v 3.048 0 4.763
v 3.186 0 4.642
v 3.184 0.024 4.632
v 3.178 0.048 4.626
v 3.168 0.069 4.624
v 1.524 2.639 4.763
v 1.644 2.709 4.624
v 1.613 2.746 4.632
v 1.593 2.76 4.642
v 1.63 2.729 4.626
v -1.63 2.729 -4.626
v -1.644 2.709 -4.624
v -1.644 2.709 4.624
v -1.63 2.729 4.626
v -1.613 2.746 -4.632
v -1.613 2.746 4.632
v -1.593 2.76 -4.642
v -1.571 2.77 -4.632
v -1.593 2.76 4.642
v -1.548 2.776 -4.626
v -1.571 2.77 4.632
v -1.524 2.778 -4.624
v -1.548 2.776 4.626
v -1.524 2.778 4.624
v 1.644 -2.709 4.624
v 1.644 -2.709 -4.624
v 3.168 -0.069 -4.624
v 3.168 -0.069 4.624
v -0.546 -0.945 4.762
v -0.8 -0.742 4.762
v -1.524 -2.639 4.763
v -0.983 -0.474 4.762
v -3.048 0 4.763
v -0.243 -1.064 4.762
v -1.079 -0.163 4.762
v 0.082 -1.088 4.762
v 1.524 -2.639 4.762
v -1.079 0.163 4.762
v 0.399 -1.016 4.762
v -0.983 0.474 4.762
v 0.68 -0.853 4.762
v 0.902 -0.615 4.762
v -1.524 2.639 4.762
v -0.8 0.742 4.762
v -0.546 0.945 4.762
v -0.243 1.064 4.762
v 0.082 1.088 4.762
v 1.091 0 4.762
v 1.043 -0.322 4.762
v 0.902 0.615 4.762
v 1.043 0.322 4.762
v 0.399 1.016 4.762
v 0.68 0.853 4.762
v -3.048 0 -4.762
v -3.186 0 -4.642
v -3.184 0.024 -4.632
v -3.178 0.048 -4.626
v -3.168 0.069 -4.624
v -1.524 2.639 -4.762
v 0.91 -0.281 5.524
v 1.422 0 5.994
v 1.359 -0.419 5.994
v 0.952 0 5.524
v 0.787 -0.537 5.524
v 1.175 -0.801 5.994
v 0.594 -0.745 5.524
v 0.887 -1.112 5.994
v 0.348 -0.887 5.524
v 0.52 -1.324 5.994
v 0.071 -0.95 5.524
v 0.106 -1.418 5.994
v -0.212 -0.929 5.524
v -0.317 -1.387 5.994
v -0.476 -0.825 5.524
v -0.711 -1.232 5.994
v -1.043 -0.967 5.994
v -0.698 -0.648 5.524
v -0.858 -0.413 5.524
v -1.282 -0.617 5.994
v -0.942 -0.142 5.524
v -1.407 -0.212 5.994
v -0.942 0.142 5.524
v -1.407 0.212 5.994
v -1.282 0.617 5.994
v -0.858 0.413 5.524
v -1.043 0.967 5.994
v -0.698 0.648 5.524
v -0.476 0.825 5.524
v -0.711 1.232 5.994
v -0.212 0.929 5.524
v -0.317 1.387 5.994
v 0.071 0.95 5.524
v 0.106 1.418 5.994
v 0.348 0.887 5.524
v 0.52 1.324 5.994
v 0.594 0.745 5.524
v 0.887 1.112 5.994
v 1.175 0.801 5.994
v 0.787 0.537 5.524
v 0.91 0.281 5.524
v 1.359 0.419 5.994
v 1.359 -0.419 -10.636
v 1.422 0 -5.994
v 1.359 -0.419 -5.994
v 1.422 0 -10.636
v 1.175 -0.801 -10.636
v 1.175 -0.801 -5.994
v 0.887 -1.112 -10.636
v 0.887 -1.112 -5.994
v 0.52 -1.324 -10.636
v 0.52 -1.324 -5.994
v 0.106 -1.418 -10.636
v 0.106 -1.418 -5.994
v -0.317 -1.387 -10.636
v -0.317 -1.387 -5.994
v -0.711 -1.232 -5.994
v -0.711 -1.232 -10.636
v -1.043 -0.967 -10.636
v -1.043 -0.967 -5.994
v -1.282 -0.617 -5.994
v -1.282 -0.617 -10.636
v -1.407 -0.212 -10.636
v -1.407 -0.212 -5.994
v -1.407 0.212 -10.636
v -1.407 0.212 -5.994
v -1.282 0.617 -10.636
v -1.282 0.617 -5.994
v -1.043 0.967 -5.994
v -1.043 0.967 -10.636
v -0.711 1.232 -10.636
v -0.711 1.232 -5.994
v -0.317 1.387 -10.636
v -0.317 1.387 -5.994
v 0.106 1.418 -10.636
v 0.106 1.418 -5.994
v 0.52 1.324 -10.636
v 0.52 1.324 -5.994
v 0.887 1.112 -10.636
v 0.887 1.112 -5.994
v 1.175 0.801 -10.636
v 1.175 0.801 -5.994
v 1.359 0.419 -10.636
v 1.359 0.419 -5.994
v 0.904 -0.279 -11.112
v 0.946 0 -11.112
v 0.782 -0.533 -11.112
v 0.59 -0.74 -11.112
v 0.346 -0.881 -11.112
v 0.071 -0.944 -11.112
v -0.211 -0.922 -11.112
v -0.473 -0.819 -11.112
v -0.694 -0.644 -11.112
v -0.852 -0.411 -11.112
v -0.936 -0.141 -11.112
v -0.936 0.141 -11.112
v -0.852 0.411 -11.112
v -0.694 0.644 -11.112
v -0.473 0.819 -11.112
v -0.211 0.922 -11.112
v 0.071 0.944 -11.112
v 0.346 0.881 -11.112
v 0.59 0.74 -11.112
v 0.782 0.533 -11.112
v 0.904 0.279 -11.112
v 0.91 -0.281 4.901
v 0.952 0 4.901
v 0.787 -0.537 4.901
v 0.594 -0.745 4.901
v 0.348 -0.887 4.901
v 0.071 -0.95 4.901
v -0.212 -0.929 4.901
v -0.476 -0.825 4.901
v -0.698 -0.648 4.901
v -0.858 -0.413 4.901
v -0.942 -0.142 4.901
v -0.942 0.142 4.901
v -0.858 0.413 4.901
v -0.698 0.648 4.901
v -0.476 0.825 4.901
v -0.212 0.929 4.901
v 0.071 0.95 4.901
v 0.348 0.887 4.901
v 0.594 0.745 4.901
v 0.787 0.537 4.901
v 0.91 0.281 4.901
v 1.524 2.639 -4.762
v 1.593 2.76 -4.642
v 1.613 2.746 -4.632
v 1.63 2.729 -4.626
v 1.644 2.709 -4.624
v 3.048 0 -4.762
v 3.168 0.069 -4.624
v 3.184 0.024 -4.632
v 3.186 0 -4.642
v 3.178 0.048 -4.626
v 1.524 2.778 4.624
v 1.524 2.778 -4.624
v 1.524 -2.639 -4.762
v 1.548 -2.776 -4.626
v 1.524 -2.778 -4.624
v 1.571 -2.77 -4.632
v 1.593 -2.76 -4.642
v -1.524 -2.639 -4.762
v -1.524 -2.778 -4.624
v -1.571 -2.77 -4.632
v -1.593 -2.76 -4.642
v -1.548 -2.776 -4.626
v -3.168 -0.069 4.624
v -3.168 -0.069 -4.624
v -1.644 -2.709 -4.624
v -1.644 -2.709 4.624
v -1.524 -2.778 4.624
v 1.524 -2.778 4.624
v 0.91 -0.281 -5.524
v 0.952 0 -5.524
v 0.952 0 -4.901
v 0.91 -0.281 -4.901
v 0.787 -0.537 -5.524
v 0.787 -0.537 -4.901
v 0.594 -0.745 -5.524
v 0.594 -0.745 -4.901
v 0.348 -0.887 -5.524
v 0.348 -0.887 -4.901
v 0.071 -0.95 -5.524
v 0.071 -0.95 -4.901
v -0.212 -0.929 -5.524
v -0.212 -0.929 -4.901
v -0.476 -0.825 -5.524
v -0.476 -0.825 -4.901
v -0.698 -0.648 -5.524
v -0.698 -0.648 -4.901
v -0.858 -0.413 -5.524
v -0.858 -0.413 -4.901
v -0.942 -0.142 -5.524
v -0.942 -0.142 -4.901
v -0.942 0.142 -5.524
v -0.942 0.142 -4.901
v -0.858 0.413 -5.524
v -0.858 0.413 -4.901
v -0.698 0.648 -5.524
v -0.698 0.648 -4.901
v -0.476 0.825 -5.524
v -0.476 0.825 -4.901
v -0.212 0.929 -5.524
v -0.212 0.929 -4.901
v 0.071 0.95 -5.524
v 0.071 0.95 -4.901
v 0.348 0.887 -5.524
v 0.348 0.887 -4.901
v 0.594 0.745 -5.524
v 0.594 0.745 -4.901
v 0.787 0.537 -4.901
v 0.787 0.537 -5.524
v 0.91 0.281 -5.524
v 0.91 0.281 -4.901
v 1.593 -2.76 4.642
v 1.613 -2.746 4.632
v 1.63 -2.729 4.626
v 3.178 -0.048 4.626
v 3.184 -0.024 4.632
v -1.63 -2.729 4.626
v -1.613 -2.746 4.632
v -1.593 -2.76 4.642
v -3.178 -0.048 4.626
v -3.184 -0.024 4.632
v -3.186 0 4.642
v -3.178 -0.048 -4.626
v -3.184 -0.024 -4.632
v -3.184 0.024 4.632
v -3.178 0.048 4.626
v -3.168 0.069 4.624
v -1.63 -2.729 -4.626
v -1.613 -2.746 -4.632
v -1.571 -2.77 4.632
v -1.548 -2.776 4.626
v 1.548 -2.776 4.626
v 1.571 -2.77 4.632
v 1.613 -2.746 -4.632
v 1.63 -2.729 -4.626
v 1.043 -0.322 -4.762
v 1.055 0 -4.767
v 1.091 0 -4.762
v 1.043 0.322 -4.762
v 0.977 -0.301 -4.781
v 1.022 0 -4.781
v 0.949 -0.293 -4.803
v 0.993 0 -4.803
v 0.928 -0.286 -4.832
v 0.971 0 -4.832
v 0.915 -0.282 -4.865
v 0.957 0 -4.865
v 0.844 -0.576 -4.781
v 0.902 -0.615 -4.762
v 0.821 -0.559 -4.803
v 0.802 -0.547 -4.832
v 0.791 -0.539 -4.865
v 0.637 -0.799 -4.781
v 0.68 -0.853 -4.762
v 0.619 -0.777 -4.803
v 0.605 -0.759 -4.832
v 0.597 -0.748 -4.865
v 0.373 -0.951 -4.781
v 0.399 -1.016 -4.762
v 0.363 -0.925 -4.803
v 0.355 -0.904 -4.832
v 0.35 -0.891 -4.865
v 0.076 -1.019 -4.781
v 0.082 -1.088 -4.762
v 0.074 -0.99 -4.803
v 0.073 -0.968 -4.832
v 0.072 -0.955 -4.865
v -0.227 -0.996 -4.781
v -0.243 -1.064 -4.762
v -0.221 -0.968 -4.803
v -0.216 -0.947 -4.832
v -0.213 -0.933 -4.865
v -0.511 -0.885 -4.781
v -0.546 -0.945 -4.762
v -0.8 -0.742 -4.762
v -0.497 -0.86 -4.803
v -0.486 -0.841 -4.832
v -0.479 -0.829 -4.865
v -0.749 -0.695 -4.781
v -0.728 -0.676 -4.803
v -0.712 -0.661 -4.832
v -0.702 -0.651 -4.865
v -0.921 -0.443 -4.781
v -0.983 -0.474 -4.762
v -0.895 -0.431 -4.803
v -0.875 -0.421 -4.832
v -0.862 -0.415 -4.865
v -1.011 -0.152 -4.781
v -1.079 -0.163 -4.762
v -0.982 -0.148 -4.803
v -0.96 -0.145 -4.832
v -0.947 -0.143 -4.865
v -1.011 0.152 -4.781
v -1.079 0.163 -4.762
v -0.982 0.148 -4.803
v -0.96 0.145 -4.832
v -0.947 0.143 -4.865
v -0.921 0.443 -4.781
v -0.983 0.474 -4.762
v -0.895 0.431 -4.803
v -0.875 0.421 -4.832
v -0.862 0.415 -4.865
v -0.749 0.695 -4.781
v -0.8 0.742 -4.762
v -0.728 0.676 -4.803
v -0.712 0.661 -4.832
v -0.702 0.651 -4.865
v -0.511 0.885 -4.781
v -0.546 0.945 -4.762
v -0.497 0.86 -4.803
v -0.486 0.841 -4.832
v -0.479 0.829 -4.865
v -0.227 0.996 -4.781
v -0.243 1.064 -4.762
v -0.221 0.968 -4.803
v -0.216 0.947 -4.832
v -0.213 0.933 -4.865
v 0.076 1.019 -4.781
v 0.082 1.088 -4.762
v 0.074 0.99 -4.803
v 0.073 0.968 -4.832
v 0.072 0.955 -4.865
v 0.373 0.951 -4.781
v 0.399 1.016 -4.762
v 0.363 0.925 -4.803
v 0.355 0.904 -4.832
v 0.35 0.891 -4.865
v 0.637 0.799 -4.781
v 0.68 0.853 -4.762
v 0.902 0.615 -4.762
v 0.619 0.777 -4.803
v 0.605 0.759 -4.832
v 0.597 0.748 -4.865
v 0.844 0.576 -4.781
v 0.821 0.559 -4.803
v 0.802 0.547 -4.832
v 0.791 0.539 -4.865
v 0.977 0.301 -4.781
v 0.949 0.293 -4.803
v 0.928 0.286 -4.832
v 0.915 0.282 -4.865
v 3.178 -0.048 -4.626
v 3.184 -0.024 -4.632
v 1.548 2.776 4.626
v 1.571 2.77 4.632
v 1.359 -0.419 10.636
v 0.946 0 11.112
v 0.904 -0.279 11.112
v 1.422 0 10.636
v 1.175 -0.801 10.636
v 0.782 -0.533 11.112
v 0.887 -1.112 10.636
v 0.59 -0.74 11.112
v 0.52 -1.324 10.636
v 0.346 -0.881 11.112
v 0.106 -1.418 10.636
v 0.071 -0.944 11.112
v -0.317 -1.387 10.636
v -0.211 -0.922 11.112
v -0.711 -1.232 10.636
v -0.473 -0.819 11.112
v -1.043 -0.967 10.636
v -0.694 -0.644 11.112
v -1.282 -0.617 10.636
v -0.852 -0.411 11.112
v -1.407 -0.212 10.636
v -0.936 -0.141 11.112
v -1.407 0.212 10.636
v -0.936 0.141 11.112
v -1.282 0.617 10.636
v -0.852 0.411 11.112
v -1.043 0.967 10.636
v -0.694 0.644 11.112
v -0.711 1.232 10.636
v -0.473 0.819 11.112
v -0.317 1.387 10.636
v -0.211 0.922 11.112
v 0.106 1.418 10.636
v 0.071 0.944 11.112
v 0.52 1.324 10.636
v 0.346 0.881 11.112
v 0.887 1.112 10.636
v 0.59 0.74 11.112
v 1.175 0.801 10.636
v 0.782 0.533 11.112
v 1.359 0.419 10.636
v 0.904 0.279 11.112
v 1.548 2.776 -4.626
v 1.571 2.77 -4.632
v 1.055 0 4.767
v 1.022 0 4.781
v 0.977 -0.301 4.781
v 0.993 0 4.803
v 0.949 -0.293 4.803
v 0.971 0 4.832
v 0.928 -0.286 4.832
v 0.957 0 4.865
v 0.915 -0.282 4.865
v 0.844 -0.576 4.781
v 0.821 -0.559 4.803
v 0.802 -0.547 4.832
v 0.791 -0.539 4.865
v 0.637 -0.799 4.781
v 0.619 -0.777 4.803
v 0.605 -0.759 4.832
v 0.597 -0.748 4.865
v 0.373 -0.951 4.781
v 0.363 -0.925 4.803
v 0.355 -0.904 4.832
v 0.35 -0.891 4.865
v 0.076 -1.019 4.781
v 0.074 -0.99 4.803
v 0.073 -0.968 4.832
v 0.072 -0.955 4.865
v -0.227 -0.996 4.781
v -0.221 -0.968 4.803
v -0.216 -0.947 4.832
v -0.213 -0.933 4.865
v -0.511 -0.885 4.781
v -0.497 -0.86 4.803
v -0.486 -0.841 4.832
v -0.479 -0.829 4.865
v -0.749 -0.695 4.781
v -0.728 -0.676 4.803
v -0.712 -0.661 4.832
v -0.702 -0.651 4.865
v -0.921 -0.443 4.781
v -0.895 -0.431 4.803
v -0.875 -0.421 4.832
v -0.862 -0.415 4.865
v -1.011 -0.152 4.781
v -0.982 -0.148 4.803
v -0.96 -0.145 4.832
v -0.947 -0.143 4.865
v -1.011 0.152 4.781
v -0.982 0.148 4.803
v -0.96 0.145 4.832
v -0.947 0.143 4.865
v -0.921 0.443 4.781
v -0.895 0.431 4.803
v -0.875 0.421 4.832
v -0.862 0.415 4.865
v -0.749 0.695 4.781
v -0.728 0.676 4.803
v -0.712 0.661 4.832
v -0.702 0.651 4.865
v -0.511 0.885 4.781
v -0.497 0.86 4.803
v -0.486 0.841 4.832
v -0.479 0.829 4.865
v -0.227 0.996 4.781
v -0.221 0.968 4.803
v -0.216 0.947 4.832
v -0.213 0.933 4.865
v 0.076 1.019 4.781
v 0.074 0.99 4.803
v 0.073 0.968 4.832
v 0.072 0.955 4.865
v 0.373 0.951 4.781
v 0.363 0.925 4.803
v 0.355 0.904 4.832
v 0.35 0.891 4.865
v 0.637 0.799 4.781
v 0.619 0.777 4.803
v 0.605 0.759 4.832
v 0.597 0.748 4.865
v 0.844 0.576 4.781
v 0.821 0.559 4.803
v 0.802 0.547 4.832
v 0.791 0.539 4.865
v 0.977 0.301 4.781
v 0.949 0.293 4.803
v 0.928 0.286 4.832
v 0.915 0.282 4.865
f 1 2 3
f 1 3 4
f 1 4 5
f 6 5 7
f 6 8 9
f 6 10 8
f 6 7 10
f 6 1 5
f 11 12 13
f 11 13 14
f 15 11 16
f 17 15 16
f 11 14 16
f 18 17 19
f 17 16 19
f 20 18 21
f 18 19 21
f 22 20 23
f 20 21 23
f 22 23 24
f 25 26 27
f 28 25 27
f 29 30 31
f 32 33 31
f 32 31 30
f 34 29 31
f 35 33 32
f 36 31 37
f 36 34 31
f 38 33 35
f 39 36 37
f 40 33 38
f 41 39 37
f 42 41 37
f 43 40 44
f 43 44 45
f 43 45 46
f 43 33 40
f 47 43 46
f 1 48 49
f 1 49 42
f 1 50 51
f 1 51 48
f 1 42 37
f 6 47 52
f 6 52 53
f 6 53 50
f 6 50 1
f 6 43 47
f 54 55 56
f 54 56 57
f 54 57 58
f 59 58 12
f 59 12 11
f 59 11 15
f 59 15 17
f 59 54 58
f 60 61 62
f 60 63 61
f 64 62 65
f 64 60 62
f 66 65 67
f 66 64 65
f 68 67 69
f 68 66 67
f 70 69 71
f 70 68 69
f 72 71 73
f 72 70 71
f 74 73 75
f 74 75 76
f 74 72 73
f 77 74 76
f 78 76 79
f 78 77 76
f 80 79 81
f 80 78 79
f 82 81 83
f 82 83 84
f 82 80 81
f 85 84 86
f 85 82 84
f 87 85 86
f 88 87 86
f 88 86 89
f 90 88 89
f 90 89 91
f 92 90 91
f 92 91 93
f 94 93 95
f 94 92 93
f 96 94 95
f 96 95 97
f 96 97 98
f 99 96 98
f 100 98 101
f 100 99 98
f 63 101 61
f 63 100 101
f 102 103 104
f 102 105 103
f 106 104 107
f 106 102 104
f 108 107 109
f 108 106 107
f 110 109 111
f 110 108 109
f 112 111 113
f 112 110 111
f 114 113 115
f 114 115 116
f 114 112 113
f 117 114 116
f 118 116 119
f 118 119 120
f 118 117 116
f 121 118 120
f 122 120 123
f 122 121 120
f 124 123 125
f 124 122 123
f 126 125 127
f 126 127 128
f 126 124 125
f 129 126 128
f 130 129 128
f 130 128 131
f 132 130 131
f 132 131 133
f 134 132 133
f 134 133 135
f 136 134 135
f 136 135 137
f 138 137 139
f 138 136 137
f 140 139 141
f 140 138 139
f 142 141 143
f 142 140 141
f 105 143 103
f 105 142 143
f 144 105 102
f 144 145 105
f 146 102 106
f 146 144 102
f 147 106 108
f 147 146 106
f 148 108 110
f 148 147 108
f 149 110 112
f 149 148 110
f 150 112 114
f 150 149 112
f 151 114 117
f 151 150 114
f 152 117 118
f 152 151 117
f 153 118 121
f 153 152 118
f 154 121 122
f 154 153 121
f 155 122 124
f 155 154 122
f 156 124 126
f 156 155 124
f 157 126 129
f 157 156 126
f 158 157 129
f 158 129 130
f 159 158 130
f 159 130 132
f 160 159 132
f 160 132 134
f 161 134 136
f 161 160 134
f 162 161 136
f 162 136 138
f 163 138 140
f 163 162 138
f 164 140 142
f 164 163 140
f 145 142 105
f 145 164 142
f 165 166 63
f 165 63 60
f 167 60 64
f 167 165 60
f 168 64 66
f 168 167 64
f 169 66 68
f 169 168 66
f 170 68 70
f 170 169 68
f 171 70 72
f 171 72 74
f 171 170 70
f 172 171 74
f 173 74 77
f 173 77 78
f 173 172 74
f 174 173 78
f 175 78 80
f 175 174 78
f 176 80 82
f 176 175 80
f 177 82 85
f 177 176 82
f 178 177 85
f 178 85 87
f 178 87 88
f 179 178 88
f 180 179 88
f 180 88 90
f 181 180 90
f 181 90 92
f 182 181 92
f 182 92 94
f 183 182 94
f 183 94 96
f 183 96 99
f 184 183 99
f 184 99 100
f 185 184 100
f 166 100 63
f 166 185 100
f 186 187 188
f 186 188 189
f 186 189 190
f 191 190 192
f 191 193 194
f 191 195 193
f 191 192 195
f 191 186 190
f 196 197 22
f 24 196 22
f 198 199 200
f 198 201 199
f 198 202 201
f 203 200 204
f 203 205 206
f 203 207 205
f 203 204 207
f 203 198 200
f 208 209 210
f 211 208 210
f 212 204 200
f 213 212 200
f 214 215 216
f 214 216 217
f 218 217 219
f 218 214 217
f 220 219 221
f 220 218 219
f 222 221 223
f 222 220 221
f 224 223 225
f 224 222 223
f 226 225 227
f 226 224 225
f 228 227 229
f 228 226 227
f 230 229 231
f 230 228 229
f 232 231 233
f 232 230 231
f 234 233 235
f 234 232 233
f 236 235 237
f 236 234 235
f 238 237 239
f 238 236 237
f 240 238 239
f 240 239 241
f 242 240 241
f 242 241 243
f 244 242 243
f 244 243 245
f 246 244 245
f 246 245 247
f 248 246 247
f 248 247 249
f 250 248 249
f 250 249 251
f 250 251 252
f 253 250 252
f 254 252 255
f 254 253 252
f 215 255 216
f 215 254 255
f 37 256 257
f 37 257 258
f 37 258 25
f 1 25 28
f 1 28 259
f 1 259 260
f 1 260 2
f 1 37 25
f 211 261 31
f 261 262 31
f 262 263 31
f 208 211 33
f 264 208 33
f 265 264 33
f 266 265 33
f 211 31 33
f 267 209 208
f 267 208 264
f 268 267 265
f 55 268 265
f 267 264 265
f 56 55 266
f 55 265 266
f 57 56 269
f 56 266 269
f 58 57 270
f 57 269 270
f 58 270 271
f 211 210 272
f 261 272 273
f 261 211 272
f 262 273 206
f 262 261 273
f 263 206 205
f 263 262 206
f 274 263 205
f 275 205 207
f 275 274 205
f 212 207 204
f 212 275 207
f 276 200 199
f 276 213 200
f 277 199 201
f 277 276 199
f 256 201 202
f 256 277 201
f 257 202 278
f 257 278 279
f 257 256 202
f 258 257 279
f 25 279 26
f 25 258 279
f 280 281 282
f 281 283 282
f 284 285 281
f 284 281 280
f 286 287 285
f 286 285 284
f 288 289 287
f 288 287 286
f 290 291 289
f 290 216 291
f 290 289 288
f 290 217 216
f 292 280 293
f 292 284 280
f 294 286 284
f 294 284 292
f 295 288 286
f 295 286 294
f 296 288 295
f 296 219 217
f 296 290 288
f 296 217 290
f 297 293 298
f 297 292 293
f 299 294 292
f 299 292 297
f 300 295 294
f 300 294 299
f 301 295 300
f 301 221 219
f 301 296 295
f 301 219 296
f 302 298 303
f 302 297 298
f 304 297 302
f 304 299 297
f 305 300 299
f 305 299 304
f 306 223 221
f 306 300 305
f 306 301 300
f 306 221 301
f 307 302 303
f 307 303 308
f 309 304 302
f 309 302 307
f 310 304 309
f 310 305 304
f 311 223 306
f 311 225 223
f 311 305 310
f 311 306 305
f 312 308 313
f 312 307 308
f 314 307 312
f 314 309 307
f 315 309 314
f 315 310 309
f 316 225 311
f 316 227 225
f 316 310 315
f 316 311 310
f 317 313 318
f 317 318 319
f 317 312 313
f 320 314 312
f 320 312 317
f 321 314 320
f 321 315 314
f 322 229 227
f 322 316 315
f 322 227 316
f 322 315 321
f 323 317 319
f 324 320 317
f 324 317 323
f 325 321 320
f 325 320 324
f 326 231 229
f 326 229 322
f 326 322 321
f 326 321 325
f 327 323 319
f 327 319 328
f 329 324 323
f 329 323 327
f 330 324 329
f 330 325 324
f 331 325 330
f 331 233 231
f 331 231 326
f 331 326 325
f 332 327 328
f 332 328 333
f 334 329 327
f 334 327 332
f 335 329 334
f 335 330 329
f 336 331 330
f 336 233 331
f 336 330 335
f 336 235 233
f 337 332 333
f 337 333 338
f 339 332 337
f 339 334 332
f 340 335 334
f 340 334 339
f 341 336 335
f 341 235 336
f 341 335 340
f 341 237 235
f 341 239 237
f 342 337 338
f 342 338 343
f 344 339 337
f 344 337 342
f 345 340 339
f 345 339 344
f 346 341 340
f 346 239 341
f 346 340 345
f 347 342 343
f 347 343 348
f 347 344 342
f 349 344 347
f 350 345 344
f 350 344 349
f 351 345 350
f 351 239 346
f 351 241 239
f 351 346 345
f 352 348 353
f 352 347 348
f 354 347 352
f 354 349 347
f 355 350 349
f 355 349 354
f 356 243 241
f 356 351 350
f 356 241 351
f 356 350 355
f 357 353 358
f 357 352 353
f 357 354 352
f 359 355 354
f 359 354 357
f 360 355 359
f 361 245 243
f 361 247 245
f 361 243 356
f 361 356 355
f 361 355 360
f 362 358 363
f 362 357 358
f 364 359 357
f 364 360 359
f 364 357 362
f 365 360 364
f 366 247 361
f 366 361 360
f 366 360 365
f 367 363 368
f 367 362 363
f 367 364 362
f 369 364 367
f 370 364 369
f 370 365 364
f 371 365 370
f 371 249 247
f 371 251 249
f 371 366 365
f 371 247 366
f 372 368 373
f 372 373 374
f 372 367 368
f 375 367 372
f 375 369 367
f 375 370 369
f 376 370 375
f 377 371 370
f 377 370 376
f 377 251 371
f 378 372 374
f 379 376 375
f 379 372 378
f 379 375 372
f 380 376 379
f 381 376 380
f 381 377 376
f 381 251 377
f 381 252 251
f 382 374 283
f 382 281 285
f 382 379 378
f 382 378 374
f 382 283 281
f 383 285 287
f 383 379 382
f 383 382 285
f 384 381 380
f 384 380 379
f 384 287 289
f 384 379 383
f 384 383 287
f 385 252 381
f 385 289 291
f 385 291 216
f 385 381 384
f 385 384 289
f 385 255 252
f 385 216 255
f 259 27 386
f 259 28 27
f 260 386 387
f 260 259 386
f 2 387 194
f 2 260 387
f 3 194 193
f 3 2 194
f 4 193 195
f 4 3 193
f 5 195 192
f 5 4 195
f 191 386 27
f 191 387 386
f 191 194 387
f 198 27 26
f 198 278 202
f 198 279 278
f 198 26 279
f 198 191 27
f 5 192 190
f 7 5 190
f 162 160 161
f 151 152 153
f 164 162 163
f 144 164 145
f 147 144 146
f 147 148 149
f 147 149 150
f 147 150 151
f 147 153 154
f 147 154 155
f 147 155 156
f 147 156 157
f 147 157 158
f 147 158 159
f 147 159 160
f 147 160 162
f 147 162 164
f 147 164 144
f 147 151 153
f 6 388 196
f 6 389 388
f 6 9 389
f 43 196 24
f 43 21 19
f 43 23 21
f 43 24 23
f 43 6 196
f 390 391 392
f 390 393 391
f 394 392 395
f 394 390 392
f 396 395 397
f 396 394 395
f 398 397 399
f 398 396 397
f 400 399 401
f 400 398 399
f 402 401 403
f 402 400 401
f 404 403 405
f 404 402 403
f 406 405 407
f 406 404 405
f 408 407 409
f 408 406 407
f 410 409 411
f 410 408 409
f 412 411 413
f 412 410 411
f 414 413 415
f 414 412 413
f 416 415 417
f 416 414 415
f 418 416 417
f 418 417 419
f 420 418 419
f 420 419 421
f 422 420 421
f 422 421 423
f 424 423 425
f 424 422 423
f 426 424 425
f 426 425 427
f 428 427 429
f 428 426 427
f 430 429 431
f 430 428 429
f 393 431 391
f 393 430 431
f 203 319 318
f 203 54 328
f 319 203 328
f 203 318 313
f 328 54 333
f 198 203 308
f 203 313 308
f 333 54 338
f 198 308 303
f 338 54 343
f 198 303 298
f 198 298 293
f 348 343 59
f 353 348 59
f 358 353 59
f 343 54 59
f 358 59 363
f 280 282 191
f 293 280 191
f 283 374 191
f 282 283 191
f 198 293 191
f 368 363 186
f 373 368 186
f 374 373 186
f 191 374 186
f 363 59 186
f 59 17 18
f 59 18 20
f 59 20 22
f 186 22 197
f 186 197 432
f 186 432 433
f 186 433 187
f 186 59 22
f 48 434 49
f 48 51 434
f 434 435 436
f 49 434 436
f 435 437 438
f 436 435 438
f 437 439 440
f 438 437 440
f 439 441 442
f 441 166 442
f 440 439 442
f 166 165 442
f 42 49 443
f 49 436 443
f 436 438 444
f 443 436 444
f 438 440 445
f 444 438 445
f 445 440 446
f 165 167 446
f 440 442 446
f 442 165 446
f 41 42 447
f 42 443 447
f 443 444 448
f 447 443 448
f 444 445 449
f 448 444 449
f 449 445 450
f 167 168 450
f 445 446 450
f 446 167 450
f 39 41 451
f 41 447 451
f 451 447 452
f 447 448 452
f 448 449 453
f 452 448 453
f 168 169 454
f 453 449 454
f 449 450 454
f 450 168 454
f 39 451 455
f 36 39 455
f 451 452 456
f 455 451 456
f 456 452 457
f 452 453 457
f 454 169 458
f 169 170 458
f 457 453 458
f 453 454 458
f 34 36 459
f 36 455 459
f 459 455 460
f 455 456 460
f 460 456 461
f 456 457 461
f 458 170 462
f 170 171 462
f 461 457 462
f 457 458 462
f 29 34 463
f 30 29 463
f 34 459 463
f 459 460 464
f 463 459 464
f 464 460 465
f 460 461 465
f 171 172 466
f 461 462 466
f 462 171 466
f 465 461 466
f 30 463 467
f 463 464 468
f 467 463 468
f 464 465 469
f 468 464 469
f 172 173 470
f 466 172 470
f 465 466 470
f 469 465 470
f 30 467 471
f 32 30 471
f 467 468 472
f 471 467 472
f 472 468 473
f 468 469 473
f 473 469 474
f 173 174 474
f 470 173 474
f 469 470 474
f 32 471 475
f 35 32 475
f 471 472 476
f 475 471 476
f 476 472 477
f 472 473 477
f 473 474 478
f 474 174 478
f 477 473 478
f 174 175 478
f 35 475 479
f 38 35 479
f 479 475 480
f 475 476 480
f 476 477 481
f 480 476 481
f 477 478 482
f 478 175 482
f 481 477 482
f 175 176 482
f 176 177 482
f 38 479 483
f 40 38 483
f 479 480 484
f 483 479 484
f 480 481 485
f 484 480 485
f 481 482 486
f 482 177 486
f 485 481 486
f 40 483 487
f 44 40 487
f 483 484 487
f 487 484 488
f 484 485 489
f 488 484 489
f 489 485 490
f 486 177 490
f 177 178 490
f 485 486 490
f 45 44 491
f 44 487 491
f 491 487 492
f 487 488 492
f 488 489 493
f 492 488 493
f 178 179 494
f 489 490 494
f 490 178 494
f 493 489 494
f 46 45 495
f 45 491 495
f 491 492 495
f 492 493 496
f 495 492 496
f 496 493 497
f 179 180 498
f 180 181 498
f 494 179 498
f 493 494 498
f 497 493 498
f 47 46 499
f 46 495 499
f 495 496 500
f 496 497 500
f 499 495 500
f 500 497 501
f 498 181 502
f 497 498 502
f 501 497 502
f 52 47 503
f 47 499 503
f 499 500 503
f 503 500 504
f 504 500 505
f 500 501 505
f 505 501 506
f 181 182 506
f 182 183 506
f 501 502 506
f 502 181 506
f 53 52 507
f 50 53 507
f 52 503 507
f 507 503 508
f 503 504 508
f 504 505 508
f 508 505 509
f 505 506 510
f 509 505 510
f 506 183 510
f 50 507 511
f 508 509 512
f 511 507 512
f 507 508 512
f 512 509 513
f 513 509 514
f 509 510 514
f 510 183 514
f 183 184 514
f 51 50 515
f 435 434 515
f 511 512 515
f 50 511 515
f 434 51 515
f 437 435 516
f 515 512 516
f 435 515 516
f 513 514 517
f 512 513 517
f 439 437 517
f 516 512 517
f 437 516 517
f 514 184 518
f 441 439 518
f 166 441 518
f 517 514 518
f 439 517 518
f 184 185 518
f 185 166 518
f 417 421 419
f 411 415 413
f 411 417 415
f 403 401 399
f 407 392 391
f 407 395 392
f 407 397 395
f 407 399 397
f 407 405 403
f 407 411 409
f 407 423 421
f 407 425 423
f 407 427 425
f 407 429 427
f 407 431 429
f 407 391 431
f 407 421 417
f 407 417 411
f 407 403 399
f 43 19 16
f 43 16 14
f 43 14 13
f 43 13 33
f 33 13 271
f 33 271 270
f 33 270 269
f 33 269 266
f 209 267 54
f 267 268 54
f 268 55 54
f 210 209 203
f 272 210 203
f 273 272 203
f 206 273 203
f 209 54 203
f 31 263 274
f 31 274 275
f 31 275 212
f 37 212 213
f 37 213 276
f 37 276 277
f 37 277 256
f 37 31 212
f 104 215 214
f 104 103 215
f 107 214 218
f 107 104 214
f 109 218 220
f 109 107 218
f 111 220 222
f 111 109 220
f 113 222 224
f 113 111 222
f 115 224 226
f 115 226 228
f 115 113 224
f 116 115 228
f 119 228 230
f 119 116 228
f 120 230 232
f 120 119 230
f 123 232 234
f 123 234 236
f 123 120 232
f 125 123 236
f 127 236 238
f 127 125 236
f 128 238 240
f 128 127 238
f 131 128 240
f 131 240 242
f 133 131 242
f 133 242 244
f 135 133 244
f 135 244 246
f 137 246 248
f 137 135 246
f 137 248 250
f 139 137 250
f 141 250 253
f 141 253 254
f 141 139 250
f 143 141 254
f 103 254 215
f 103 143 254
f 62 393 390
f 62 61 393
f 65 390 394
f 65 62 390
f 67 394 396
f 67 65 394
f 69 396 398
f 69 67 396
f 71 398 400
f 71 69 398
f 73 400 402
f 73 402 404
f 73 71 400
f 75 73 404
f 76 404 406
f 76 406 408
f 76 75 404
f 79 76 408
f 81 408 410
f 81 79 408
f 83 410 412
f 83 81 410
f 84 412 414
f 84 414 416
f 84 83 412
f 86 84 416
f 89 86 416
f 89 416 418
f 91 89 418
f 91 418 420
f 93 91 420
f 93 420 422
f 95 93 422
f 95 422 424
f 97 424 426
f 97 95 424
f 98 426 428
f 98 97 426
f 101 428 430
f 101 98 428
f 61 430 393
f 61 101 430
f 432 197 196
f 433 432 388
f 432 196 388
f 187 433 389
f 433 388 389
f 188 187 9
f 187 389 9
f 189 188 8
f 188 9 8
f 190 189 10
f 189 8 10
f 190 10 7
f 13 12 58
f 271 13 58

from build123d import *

# Parameters (mm, degrees)
BOSS_EXTRUDE1_DEPTH      = 4.7625
BOSS_EXTRUDE1_DEPTH_BACK = 4.7625
CHAMFER1_SIZE            = 0.13890625
FILLET1_R                = 0.13890625


with BuildPart() as part:
    # Sketch3 → Revolve1 (revolve)
    with BuildSketch(Plane(origin=(0, 0, 0), x_dir=(0, 0, -1), z_dir=(1, 0, 0)), mode=Mode.PRIVATE) as revolve1_sk:
        Polygon((11.1125, 0), (-11.1125, 0), (-11.1125, 0.94615), (-10.63625, 1.4224), (-5.9944, 1.4224), (-5.5245, 0.9525), (-4.7625, 0.9525), (-4.7625, 2.778125), (4.7625, 2.778125), (4.7625, 0.9525), (5.5245, 0.9525), (5.9944, 1.4224), (10.63625, 1.4224), (11.1125, 0.94615), align=None)
    revolve(revolve1_sk.sketch.rotate(Axis((0, 0, 11.1125), (0, 0, -1)), 90), axis=Axis((0, 0, 11.1125), (0, 0, -1)))

    # Sketch4 → Boss-Extrude1 (add, two sides: drawn at the far end of the back side and taken through both)
    with BuildSketch(Plane.XY.offset(-BOSS_EXTRUDE1_DEPTH_BACK)):
        Polygon((-3.207902433, 0), (-1.603951217, -2.778125), (1.603951217, -2.778125), (3.207902433, 0), (1.603951217, 2.778125), (-1.603951217, 2.778125), align=None)
    extrude(amount=BOSS_EXTRUDE1_DEPTH + BOSS_EXTRUDE1_DEPTH_BACK)

    # Chamfer1
    chamfer1_edges = [part.edges().sort_by_distance(p)[0] for p in [
        (2.405926825, 1.3890625, 4.7625),
        (0, 2.778125, 4.7625),
        (-2.405926825, 1.3890625, 4.7625),
        (-2.405926825, -1.3890625, 4.7625),
        (0, -2.778125, 4.7625),
        (2.405926825, -1.3890625, 4.7625),
        (-2.405926825, 1.3890625, -4.7625),
        (0, 2.778125, -4.7625),
        (2.405926825, 1.3890625, -4.7625),
        (2.405926825, -1.3890625, -4.7625),
        (0, -2.778125, -4.7625),
        (-2.405926825, -1.3890625, -4.7625),
    ]]
    chamfer(chamfer1_edges, length=CHAMFER1_SIZE)

    # Fillet1
    fillet1_edges = [part.edges().sort_by_distance(p)[0] for p in [
        (-0.9525, 0, -4.7625),
        (-0.9525, 0, 4.7625),
        (-3.207902433, 0, 0),
        (-1.603951217, 2.778125, 0),
        (-1.603951217, -2.778125, 0),
        (1.603951217, -2.778125, 0),
        (3.207902433, 0, 0),
        (1.603951217, 2.778125, 0),
    ]]
    fillet(fillet1_edges, radius=FILLET1_R)


solid = part.part
